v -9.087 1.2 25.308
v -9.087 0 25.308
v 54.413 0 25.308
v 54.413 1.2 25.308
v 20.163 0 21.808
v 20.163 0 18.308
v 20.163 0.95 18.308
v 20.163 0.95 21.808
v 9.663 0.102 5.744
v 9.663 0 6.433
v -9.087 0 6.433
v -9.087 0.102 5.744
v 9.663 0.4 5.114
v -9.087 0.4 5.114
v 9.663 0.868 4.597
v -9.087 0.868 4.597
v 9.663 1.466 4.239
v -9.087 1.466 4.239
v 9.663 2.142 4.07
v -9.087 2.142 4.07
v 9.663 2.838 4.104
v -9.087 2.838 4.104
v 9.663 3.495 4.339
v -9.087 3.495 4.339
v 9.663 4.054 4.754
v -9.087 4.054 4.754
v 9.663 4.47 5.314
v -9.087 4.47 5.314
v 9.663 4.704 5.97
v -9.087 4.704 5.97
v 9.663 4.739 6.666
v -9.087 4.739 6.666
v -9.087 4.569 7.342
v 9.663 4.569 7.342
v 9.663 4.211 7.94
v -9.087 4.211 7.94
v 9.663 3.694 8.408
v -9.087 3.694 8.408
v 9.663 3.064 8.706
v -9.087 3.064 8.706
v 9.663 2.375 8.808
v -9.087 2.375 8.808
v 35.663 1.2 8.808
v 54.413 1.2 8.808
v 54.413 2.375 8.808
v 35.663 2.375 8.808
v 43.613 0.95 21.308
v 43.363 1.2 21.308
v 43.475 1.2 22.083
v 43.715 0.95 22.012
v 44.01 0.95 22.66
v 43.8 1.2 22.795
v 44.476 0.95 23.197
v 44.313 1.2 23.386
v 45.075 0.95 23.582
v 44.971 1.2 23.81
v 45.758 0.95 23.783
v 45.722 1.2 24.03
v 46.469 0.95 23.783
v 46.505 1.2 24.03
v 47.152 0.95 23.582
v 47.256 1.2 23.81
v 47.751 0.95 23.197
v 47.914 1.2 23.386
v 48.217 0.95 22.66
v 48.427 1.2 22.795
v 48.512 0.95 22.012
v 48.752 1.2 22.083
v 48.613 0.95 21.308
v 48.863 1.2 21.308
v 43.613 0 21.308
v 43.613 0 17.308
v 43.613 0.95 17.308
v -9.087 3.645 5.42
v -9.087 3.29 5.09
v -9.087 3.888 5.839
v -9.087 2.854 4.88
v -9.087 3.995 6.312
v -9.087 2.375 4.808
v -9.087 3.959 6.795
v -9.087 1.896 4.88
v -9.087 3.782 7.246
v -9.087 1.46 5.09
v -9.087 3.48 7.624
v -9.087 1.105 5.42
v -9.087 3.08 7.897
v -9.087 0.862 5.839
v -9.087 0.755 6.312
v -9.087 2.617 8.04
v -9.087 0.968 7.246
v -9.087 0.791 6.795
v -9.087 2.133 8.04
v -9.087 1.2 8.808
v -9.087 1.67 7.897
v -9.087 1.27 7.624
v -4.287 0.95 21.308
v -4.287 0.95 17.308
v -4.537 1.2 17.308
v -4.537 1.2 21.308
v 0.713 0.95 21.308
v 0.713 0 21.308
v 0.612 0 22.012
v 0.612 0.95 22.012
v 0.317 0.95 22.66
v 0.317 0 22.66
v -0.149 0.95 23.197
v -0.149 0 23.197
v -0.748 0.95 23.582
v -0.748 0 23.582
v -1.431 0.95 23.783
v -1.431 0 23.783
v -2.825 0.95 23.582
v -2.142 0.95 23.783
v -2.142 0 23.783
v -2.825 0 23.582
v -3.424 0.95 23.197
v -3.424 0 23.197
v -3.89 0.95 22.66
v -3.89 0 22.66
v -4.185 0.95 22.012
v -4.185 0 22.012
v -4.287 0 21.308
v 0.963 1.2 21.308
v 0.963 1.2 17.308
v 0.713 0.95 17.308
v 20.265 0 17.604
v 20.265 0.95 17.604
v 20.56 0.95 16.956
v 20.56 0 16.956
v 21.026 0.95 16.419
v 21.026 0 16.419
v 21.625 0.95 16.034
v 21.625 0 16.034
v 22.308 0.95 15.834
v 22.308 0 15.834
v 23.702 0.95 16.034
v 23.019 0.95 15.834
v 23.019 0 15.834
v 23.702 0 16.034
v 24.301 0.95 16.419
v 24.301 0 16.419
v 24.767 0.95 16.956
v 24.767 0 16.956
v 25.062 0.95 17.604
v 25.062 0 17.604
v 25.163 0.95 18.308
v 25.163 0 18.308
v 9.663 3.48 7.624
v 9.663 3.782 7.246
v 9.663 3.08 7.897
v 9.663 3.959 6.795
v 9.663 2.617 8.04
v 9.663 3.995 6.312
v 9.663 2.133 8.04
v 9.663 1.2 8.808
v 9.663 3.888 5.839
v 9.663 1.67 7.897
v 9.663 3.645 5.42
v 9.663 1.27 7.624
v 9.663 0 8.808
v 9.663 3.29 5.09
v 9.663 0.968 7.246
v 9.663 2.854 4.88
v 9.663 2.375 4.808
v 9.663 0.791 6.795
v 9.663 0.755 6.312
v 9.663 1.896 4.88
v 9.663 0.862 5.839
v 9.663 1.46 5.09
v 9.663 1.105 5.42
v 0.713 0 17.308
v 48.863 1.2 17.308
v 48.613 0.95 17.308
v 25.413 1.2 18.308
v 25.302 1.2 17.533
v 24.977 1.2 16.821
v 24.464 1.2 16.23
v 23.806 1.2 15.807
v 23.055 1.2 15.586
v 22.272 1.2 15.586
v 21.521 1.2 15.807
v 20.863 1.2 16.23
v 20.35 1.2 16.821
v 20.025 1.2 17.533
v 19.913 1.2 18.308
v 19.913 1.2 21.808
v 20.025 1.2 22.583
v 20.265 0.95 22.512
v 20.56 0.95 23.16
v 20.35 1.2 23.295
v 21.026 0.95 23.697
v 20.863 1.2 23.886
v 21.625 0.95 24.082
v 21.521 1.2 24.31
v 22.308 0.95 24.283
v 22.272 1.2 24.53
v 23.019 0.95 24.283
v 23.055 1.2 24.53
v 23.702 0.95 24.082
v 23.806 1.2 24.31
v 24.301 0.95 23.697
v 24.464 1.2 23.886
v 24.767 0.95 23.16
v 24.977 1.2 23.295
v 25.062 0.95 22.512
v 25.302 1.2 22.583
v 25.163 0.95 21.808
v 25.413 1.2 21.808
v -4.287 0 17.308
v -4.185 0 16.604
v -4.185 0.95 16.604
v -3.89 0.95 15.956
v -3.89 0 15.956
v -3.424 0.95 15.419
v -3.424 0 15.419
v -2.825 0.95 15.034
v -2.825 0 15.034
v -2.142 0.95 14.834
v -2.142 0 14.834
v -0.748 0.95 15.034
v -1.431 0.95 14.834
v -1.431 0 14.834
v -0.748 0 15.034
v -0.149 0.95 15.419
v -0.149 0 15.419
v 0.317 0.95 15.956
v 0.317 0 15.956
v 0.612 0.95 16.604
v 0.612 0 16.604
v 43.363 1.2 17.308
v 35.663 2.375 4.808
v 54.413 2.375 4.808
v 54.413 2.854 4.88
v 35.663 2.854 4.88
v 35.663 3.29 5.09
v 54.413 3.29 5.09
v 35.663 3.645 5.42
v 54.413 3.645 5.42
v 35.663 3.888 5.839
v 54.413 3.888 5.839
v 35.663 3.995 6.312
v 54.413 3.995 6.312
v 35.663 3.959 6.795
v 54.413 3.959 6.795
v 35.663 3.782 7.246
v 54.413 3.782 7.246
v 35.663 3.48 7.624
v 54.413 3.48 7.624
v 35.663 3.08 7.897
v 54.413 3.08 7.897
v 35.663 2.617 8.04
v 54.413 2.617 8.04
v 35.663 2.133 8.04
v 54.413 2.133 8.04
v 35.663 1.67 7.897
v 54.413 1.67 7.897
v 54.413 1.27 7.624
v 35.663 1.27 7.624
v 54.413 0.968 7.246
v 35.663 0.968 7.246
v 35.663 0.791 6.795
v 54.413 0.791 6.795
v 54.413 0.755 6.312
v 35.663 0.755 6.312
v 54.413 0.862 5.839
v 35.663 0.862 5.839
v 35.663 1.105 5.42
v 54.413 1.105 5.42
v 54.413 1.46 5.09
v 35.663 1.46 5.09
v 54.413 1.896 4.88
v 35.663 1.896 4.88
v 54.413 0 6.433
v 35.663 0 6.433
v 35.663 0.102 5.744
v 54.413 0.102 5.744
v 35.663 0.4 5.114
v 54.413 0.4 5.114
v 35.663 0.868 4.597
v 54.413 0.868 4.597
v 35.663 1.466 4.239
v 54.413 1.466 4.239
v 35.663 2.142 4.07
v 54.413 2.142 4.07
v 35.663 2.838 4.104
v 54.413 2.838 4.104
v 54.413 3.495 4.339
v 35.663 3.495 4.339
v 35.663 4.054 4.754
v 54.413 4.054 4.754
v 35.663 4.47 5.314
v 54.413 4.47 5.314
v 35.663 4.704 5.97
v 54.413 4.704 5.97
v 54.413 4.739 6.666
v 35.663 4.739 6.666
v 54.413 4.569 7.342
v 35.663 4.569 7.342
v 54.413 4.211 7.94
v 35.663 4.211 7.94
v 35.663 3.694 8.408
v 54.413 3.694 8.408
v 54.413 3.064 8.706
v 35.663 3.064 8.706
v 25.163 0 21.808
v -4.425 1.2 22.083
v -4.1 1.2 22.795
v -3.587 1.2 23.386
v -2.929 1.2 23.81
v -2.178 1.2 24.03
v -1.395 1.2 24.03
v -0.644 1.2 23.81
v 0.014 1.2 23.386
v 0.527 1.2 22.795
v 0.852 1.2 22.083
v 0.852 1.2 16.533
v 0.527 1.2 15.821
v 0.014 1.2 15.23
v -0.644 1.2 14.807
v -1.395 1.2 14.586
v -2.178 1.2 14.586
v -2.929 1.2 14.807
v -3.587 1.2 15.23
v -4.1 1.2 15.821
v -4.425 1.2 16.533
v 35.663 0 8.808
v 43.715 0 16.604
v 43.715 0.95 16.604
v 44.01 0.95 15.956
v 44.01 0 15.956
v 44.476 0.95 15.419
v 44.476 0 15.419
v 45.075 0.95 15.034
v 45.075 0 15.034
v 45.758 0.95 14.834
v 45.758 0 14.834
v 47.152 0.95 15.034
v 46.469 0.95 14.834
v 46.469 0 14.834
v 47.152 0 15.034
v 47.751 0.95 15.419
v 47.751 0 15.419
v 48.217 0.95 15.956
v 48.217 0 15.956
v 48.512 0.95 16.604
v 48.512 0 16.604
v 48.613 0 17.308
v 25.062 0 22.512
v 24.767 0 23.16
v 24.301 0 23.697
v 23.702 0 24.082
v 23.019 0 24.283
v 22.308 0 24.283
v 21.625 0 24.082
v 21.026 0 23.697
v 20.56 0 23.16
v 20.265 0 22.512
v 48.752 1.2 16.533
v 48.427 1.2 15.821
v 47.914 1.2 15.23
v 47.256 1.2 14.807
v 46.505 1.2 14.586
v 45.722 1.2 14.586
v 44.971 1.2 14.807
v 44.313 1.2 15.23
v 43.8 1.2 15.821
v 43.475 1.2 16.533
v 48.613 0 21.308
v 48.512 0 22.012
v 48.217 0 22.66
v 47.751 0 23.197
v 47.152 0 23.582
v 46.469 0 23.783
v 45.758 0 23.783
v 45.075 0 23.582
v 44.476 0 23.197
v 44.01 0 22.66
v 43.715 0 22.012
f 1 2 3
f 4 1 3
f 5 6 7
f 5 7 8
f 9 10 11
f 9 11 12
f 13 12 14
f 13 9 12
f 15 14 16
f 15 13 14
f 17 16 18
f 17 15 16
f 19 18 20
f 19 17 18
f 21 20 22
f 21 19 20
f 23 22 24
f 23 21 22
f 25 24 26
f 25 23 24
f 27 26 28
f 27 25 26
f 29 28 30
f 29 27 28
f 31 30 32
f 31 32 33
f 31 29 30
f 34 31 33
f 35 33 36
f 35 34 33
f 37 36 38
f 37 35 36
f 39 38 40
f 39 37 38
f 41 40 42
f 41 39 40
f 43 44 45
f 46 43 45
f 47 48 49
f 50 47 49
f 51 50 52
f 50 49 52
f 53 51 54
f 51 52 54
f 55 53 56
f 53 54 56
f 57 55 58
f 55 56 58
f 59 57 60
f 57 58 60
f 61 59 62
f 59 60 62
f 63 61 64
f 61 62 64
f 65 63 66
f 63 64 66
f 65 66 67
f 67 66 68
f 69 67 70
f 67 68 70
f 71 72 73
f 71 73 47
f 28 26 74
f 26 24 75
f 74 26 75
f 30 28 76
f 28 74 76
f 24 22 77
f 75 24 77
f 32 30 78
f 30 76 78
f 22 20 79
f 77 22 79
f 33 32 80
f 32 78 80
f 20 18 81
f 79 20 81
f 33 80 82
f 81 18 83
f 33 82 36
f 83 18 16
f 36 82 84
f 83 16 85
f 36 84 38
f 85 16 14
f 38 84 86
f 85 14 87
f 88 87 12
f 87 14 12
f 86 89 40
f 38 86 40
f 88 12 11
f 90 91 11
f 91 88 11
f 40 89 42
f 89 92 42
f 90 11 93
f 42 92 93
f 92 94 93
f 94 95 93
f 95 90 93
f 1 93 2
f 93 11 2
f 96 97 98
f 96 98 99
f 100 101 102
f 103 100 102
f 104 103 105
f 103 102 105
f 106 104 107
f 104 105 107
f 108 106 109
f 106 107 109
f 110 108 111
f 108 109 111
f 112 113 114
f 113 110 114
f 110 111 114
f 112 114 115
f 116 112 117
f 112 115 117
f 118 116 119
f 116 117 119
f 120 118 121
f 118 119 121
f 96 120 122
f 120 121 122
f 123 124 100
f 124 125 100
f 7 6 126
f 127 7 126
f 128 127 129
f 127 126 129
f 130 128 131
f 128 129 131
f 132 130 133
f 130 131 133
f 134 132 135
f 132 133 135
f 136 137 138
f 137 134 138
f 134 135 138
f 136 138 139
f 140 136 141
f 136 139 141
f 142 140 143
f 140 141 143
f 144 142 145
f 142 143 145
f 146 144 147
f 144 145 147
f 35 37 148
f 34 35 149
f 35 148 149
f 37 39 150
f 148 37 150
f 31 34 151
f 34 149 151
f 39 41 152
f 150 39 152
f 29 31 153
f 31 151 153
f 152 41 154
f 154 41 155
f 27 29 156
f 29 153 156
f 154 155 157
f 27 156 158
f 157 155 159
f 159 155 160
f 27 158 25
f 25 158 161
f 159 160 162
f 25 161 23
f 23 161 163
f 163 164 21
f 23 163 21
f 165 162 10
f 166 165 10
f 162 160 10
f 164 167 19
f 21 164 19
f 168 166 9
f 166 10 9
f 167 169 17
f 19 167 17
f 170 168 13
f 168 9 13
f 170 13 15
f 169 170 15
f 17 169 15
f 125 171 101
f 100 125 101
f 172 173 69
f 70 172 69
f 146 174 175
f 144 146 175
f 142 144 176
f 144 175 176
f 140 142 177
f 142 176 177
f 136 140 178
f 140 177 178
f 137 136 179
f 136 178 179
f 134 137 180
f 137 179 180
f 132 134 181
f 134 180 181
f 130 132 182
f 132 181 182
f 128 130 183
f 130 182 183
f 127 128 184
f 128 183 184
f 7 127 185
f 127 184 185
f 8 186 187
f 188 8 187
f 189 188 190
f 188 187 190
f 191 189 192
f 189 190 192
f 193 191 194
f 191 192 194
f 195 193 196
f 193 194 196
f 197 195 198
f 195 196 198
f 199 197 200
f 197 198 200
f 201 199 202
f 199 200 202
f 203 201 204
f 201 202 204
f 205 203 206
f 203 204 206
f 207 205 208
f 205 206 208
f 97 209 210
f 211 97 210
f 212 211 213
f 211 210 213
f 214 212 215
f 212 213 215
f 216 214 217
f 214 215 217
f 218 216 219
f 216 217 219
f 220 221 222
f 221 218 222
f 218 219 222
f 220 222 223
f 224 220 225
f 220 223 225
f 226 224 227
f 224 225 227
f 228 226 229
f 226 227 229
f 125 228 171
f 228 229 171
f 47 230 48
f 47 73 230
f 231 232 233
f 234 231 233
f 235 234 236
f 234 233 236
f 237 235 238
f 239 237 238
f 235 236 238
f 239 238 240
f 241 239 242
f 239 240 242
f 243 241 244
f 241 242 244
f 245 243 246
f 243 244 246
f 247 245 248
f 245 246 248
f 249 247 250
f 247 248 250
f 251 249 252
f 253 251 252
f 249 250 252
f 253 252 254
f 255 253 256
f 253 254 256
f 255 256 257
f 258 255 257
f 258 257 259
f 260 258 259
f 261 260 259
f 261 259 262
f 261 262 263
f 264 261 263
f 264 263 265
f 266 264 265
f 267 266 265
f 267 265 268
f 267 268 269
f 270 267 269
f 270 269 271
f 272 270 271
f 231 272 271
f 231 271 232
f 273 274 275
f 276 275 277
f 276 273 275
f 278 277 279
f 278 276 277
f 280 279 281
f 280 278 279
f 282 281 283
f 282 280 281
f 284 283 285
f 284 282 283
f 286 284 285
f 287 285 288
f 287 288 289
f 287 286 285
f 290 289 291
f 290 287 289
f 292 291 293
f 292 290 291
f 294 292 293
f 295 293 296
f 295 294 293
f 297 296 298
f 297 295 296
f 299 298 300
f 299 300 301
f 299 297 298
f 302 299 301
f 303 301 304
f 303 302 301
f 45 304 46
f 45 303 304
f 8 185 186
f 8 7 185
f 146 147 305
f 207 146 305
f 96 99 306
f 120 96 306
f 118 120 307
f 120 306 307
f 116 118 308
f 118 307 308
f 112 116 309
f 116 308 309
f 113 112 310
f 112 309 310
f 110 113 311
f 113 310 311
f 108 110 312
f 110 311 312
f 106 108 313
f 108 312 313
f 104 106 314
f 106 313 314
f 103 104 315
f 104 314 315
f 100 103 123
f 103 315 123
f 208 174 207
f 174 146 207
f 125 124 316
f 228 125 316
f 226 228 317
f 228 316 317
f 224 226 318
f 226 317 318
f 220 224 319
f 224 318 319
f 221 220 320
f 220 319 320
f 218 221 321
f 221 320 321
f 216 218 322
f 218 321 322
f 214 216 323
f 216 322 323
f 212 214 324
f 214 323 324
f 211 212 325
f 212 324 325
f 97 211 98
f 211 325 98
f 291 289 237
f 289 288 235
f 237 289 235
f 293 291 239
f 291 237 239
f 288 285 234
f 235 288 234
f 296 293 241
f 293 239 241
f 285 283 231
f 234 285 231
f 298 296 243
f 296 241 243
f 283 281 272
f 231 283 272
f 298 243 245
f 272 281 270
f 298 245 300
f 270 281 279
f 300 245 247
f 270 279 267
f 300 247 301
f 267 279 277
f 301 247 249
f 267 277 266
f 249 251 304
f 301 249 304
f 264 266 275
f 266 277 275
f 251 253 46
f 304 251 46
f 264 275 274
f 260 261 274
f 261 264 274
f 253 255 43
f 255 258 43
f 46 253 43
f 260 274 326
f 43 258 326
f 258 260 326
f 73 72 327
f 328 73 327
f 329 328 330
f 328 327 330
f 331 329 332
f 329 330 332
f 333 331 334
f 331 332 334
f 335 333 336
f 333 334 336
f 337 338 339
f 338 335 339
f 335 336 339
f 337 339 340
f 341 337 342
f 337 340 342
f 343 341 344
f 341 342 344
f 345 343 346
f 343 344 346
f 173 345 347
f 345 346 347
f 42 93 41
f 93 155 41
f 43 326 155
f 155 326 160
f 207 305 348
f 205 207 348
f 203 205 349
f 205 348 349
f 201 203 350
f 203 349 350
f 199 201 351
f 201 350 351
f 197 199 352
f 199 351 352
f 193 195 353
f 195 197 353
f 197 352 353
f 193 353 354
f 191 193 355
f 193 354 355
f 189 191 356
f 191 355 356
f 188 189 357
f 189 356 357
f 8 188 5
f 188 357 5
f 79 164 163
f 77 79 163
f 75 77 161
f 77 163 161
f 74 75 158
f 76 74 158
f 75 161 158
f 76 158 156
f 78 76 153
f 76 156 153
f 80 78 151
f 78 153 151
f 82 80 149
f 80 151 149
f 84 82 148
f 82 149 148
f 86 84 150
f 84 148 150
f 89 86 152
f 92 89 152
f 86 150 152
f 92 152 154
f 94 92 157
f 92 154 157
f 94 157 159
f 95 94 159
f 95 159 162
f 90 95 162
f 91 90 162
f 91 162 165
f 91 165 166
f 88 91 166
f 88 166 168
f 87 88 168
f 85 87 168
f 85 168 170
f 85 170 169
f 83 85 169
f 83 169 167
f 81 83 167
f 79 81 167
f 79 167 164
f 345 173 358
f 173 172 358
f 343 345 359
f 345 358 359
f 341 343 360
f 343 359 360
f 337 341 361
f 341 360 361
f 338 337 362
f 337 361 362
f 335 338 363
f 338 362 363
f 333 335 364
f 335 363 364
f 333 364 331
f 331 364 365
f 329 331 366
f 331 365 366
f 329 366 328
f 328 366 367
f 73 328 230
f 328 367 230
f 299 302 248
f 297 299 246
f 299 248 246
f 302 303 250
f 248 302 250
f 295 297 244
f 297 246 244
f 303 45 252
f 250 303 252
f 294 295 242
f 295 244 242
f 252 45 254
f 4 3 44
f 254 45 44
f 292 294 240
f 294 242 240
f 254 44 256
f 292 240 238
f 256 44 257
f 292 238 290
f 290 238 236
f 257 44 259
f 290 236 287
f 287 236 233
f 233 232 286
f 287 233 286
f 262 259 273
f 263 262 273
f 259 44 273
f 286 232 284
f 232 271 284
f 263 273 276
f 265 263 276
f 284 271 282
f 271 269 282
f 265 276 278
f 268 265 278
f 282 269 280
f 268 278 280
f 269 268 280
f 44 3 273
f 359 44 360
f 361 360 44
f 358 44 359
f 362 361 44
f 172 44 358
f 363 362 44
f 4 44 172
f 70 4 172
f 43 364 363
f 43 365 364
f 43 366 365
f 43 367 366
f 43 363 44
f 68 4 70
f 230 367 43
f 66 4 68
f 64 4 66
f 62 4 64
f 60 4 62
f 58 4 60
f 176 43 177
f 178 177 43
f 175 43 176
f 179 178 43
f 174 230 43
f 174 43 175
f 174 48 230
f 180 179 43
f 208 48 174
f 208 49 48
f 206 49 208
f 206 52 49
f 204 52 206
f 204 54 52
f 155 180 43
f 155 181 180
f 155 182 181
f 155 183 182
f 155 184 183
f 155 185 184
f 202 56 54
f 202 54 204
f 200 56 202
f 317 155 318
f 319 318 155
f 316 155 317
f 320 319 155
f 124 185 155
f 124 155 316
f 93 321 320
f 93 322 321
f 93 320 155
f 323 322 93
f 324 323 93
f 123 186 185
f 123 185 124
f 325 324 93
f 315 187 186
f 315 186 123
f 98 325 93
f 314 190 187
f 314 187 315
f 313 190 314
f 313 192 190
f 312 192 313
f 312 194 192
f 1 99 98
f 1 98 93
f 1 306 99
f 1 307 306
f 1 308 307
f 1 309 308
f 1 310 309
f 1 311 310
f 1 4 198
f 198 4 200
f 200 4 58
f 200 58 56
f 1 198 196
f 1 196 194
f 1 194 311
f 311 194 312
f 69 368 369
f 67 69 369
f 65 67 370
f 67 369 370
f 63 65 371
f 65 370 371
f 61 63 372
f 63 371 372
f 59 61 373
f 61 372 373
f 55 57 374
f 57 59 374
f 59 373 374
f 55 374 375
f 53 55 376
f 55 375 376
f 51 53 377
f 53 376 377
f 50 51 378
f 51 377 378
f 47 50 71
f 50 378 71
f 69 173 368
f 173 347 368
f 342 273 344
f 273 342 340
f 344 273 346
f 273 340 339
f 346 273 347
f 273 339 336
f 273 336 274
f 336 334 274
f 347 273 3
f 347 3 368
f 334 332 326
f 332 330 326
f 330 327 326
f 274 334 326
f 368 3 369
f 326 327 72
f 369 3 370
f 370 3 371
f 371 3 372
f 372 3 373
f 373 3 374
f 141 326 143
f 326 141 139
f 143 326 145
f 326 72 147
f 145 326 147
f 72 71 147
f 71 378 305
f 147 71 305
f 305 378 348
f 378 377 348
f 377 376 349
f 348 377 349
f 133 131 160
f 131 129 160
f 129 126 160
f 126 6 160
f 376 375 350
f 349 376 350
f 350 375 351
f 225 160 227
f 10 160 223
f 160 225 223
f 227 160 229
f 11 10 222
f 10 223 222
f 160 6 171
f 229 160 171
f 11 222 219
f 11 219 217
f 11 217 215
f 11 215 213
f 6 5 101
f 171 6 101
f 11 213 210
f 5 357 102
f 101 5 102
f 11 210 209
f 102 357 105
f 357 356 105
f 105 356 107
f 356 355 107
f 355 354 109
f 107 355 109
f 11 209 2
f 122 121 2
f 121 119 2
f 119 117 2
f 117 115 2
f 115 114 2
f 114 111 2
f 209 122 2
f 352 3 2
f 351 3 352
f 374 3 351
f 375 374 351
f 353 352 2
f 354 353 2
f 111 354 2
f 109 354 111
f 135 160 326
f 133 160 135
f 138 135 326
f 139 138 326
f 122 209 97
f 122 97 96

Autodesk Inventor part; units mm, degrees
ref_plane "YZ Plane" through (0, 0, 0) normal (1, 0, 0) x (0, 1, 0)
ref_plane "XZ Plane" through (0, 0, 0) normal (0, 1, 0) x (-1, 0, 0)
ref_plane "XY Plane" through (0, 0, 0) normal (0, 0, 1) x (1, 0, 0)
sketch "Boceto1" plane through (0, 0, 0) normal (0, 1, 0) x (-1, 0, 0)
  line L0 (9.0866, 25.3081) -> (-54.4134, 25.3081)
  line L1 (-54.4134, 25.3081) -> (-54.4134, 8.8081)
  line L2 (-54.4134, 8.8081) -> (9.0866, 8.8081)
  line L3 (9.0866, 8.8081) -> (9.0866, 25.3081)
  arc A0 (-0.7134, 17.3081) -> (4.2866, 17.3081) centre (1.7866, 17.3081) ccw
  arc A1 (-25.1634, 18.3081) -> (-20.1634, 18.3081) centre (-22.6634, 18.3081) ccw
  arc A2 (-48.6134, 17.3081) -> (-43.6134, 17.3081) centre (-46.1134, 17.3081) ccw
  line L4 (4.2866, 17.3081) -> (4.2866, 21.3081)
  line L5 (-0.7134, 17.3081) -> (-0.7134, 21.3081)
  arc A3 (4.2866, 21.3081) -> (-0.7134, 21.3081) centre (1.7866, 21.3081) ccw
  line L6 (-43.6134, 17.3081) -> (-43.6134, 21.3081)
  line L7 (-48.6134, 17.3081) -> (-48.6134, 21.3081)
  arc A4 (-43.6134, 21.3081) -> (-48.6134, 21.3081) centre (-46.1134, 21.3081) ccw
  line L8 (-20.1634, 18.3081) -> (-20.1634, 21.8081)
  line L9 (-25.1634, 18.3081) -> (-25.1634, 21.8081)
  arc A5 (-20.1634, 21.8081) -> (-25.1634, 21.8081) centre (-22.6634, 21.8081) ccw
  point P0 (0, 0)
  dimension "d1" = 16.5
  dimension "d2" = 5
  dimension "d3" = 5
  dimension "d4" = 5
  dimension "d10" = 7
  dimension "d11" = 31.75
  dimension "d12" = 8
  dimension "d13" = 8.3
  dimension "d14" = 63.5
  dimension "d15" = 8
  dimension "d16" = 7.3
  dimension "d30" = 4
  dimension "d31" = 4
  dimension "d32" = 4
  dimension "d33" = 4
  dimension "d34" = 3.5
  dimension "d35" = 3.5
extrude "Extrusión1" add sketch "Boceto1" along normal blind 1.2
sketch "Boceto2" plane through (54.4134, 0, 25.3081) normal (1, 0, 0) x (0, 0, -1)
  circle A0 centre (18.875, 2.375) radius 2.375
  circle A1 centre (18.875, 2.375) radius 1.625
  line L0 (16.5, 0) -> (16.5, 1.2) projected
  line L1 (0, 0) -> (16.5, 0) projected
  line L2 (16.5, 0) -> (16.5, 1.2) projected
  line L3 (16.5, 1.2) -> (16.5, 2.375)
  line L4 (16.5, 1.2) -> (16.5, 0)
  line L5 (16.5, 0) -> (18.875, 0)
  point P0 (25.3081, 0)
  dimension "d19" = 4.75
  dimension "d20" = 3.25
extrude "Extrusión2" add sketch "Boceto2" against normal blind 63.5
sketch "Boceto3" plane through (0, 0, 0) normal (0, -1, 0) x (1, 0, 0)
  line L0 (54.4134, 8.8081) -> (-9.0866, 8.8081) projected
  line L1 (-9.0866, 8.8081) -> (54.4134, 8.8081)
  line L2 (22.6634, 8.8081) -> (35.6634, 8.8081)
  line L3 (35.6634, 8.8081) -> (9.6634, 8.8081)
  line L4 (9.6634, 8.8081) -> (9.6634, -4.6873)
  line L5 (9.6634, -4.6873) -> (35.6634, -4.6873)
  line L6 (35.6634, -4.6873) -> (35.6634, 8.8081)
  point P0 (0, 0)
  dimension "d23" = 13
  dimension "d24" = 26
extrude "Extrusión3" cut sketch "Boceto3" against normal blind 63.5
chamfer "Chaflán1" distance 0.25 angle 45 3 edges at (22.6634, 1.2, 15.8081) (-1.7866, 1.2, 14.8081) (46.1134, 1.2, 14.8081)
properties part number "Ala 1 Bisagra tipo T"
